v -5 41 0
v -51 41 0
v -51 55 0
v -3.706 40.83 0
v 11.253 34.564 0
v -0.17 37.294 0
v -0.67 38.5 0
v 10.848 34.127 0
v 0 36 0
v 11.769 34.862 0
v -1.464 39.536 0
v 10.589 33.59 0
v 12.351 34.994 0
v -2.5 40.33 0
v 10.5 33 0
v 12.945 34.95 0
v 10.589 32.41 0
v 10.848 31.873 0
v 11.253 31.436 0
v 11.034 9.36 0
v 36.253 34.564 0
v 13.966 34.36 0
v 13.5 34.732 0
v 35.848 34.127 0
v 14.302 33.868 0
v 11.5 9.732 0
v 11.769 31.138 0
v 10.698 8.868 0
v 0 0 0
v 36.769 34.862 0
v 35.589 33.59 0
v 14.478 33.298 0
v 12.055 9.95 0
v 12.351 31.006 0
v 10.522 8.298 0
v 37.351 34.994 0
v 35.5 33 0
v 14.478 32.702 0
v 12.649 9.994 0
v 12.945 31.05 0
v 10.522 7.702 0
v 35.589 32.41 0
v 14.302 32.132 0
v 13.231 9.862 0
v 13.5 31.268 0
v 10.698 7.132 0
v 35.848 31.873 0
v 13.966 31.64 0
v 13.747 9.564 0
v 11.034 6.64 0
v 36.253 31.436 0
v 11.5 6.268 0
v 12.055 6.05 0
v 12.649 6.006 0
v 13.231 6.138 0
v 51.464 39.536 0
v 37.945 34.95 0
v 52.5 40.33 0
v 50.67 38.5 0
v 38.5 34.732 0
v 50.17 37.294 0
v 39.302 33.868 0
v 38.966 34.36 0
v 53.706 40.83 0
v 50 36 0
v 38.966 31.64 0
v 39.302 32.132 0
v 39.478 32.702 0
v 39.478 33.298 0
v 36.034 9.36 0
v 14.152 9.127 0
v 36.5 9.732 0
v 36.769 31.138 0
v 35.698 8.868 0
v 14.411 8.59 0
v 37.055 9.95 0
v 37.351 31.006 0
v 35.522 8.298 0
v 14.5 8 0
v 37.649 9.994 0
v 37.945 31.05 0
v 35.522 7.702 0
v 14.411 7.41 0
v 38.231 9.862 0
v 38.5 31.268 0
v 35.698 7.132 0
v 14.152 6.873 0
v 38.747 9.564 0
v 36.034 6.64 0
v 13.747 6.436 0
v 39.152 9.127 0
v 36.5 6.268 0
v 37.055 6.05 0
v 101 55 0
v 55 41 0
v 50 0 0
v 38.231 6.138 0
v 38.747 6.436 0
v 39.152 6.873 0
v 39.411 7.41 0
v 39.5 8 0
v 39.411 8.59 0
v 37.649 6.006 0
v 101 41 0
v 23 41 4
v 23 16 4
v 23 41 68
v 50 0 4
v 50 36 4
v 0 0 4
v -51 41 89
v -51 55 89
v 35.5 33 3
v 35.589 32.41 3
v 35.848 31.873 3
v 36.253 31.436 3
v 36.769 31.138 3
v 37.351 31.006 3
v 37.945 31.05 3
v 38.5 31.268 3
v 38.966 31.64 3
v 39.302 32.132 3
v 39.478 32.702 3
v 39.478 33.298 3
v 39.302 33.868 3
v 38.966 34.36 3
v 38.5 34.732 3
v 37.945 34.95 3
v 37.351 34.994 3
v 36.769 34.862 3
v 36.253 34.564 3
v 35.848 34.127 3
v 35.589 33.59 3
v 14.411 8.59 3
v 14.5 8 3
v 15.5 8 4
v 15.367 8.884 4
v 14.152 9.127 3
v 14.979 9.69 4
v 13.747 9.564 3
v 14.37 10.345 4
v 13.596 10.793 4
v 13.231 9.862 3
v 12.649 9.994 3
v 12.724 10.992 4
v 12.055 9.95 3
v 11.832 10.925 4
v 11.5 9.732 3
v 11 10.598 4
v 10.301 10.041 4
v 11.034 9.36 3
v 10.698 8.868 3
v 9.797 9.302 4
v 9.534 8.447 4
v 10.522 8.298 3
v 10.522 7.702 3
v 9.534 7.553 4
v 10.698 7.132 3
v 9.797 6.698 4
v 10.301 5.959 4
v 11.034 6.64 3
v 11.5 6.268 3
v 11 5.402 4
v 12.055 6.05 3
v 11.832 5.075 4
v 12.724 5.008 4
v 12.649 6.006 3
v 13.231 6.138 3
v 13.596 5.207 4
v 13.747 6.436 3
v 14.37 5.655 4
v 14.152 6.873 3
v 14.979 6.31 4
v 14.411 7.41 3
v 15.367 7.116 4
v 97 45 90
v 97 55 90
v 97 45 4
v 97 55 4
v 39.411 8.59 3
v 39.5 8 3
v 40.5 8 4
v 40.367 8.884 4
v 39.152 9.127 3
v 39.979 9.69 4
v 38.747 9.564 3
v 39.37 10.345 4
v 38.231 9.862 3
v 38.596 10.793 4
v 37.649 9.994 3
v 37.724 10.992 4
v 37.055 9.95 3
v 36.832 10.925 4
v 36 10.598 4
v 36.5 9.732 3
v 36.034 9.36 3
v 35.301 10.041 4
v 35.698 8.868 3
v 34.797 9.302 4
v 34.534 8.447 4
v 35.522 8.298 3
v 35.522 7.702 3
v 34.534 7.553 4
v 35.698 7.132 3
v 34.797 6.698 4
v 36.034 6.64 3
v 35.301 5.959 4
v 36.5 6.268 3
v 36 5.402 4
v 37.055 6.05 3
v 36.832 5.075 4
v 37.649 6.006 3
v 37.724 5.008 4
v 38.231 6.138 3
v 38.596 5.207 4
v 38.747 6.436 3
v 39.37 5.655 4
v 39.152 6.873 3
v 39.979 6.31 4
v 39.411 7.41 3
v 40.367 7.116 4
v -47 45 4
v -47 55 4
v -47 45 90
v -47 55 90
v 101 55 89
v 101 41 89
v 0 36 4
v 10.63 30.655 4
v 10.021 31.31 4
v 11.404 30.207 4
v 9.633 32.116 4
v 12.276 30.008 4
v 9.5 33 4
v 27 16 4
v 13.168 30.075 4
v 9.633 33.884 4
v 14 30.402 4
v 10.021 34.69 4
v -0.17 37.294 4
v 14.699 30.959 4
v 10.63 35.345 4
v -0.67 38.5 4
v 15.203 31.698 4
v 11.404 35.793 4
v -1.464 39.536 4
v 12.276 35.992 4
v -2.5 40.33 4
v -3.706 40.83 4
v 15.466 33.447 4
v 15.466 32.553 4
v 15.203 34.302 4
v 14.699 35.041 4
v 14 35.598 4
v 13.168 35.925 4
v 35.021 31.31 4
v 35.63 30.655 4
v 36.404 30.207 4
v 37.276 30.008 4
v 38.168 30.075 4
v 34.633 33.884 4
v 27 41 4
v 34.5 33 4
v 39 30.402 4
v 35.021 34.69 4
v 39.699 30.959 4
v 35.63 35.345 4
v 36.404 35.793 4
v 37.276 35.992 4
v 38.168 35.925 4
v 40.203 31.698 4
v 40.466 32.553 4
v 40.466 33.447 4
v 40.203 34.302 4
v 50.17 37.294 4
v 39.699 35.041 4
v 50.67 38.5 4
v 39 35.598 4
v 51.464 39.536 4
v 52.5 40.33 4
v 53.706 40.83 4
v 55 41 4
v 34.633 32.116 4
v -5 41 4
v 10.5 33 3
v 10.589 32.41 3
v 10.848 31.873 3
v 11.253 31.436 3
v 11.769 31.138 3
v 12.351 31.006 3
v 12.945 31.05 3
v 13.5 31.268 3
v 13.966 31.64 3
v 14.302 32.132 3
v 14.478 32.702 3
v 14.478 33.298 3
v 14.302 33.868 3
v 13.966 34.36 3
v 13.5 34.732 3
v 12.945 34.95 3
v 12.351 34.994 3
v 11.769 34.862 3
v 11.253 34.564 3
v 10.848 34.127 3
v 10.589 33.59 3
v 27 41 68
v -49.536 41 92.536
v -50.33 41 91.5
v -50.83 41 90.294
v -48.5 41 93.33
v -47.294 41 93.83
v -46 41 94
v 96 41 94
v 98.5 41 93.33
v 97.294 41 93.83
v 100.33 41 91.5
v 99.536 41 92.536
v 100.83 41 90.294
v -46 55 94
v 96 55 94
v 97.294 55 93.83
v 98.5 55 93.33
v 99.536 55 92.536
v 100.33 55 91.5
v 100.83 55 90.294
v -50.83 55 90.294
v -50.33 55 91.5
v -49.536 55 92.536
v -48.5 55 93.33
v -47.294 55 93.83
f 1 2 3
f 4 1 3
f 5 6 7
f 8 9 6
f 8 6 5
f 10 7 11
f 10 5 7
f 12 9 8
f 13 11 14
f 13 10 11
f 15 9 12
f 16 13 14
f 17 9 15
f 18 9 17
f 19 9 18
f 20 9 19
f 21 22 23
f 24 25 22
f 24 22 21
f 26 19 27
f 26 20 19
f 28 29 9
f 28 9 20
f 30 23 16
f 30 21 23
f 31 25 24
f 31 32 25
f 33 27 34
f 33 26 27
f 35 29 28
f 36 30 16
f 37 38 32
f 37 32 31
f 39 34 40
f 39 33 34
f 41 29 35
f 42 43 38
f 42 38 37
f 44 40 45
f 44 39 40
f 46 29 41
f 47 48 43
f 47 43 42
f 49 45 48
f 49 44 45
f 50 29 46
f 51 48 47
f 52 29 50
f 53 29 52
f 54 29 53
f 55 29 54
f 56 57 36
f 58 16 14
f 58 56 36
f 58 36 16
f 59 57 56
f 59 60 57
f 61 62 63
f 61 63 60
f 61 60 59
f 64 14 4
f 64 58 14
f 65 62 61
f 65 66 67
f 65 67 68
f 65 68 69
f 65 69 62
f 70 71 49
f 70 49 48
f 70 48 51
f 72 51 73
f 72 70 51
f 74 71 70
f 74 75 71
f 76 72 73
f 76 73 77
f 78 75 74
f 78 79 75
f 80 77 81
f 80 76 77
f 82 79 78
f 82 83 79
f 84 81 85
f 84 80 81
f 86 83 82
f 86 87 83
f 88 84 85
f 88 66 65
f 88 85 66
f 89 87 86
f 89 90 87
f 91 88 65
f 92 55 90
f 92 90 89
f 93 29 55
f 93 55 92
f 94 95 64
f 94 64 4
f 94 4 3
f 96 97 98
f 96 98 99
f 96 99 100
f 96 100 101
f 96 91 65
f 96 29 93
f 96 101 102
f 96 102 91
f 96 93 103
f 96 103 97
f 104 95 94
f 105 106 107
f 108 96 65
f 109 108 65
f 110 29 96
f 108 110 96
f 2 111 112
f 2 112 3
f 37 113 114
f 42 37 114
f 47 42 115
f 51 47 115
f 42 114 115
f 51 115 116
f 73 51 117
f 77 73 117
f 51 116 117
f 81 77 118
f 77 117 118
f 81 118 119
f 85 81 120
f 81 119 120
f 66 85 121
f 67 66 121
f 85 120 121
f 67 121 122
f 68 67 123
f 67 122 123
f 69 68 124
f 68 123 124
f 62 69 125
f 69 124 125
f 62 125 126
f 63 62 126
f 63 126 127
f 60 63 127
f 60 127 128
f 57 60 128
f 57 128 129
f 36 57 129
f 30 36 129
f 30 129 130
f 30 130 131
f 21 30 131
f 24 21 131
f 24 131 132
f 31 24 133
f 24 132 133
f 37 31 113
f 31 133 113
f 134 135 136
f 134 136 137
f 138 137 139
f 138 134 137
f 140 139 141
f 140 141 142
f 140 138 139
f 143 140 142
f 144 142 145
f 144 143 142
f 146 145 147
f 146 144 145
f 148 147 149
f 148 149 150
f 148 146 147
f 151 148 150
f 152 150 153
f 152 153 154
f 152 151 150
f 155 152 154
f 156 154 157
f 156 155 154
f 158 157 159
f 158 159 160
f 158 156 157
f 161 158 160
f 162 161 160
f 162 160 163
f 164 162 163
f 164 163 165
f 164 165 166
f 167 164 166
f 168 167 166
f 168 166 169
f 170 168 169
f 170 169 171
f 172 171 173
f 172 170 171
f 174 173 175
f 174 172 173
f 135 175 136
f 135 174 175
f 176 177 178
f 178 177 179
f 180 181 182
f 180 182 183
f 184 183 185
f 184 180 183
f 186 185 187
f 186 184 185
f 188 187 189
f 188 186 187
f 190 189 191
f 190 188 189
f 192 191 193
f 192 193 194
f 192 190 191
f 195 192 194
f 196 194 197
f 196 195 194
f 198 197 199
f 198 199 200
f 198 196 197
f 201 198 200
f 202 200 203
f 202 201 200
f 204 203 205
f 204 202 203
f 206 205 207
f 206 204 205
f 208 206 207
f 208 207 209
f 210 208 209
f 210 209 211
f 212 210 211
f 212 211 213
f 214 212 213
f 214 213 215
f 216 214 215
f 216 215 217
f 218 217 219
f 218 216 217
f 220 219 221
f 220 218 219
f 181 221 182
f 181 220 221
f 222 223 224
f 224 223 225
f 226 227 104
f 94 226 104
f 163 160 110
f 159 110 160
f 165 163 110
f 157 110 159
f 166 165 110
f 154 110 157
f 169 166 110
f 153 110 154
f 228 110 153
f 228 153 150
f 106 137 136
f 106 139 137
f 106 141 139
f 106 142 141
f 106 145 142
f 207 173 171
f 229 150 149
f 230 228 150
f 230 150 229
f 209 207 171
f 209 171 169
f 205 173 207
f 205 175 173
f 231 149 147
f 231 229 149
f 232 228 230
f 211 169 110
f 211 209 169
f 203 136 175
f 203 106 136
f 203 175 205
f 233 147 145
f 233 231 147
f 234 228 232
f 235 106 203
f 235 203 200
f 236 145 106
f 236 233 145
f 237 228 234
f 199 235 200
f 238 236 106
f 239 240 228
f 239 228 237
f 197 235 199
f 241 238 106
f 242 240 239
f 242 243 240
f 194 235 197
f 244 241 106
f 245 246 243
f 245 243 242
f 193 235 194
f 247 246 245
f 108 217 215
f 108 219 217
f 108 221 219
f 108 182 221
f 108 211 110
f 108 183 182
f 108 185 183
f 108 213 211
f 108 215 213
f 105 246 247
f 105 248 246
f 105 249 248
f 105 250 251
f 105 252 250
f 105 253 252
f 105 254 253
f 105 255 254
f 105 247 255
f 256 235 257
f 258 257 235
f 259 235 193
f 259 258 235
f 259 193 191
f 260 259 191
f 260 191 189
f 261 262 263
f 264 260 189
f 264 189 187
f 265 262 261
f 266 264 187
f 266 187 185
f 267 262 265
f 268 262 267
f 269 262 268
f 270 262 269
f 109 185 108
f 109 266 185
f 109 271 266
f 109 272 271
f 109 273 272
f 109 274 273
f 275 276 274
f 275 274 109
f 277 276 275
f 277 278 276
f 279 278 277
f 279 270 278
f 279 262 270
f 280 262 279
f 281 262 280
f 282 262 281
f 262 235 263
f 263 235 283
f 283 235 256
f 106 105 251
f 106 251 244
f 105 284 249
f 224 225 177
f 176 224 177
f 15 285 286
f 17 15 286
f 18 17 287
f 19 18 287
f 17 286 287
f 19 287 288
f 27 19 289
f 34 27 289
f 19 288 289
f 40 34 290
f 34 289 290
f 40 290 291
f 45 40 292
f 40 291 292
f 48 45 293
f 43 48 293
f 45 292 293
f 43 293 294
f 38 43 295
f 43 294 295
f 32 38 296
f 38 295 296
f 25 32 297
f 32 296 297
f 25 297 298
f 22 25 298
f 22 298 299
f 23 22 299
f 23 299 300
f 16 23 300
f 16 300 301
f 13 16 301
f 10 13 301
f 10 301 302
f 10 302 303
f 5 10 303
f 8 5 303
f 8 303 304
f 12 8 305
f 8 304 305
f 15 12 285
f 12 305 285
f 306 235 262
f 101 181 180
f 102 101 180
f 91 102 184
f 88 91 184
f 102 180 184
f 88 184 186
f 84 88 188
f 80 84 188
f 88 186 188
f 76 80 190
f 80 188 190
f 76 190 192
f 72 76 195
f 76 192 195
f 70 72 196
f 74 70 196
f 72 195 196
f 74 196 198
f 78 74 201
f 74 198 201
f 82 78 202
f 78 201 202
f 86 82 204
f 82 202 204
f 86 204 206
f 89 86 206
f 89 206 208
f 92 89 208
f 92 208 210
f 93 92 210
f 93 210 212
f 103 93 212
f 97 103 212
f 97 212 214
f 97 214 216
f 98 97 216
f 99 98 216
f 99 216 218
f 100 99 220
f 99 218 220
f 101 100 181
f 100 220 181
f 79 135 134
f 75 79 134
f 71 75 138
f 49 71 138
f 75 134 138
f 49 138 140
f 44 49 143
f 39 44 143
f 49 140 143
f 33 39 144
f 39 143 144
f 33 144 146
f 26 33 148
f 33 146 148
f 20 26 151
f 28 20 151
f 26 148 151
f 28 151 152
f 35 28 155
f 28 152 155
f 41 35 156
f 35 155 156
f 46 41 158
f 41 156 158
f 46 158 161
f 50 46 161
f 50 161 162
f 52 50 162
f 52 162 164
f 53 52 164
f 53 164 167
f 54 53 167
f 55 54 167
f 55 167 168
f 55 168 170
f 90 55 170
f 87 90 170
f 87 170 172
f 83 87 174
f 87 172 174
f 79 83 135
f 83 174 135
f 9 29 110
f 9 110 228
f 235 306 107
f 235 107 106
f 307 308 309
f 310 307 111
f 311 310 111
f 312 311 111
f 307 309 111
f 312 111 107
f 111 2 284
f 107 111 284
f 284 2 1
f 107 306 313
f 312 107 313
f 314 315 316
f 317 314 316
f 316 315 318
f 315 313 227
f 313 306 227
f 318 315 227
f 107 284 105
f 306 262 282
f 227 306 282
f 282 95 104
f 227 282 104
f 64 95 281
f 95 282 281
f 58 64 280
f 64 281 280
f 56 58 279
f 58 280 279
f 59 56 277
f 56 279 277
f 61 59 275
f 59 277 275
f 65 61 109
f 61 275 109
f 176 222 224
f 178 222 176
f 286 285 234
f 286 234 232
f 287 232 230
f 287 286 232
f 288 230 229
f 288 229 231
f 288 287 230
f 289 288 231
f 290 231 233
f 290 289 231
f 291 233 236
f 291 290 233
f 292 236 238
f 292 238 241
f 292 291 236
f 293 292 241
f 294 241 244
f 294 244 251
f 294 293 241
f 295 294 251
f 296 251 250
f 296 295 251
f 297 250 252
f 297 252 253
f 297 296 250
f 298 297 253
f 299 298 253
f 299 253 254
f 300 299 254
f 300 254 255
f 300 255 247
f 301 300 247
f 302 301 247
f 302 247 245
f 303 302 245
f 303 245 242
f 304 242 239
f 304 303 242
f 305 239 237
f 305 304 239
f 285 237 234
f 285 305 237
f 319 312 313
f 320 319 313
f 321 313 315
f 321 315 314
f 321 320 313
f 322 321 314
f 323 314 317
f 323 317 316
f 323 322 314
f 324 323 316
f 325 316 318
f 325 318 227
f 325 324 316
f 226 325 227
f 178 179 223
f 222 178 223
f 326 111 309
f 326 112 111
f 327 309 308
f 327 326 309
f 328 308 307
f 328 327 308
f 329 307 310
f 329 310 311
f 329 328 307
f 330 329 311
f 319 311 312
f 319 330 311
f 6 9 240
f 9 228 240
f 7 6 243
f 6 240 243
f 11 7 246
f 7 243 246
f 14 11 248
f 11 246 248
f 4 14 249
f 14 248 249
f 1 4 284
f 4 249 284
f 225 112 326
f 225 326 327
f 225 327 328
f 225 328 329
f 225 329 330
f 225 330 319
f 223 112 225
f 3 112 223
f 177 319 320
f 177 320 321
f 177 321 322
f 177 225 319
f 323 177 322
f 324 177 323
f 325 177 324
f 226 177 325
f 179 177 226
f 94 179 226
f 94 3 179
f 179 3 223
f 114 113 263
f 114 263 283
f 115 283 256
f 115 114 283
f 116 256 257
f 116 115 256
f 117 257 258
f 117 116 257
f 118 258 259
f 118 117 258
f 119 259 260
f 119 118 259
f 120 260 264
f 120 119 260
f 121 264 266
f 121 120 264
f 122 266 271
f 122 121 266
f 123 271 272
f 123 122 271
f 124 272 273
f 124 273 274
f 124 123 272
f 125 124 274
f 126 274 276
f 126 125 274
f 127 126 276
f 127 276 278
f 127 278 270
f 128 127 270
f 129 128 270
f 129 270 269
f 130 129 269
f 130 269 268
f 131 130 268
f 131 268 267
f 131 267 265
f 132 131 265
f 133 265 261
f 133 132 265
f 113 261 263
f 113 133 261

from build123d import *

# Parameters (mm, degrees)
SKETCH2_W           = 50
SKETCH2_H           = 41
BOSS_EXTRUDE1_DEPTH = 4
SKETCH4_W           = 152
SKETCH4_H           = 94
BOSS_EXTRUDE2_DEPTH = 14
CUT_EXTRUDE1_DEPTH  = 10
FILLET1_R           = 5
SKETCH5_W           = 4
SKETCH5_H           = 41
BOSS_EXTRUDE3_DEPTH = 80
CUT_EXTRUDE2_DEPTH  = 4
SKETCH7_R           = 2
CUT_EXTRUDE3_DEPTH  = 4
CHAMFER1_SIZE       = 1
FILLET2_R           = 5


with BuildPart() as part:
    # Sketch2 → Boss-Extrude1 (new body)
    with BuildSketch(Plane.XY):
        with Locations((25, 20.5)):
            Rectangle(SKETCH2_W, SKETCH2_H)
    extrude(amount=BOSS_EXTRUDE1_DEPTH)

    # Sketch4 → Boss-Extrude2 (add)
    with BuildSketch(Plane(origin=(0, 41, 0), x_dir=(1, 0, 0), z_dir=(0, 1, 0))):
        with Locations((25, -47)):
            Rectangle(SKETCH4_W, SKETCH4_H)
    extrude(amount=BOSS_EXTRUDE2_DEPTH)

    # 3DSketch1 → Cut-Extrude1 (cut)
    with BuildSketch(Plane(origin=(97, 55, 90), x_dir=(-0.8585432690668222, 0, -0.512741119026019), z_dir=(0, -1, 0))):
        Polygon((0, 0), (44.095736236, 73.83472114), (167.725966982, 0), (123.630230746, -73.83472114), align=None)
    extrude(amount=CUT_EXTRUDE1_DEPTH, mode=Mode.SUBTRACT)

    # Fillet1
    fillet1_edges = [part.edges().sort_by_distance(p)[0] for p in [
        (-51, 48, 94),
        (101, 48, 94),
    ]]
    fillet(fillet1_edges, radius=FILLET1_R)

    # Sketch5 → Boss-Extrude3 (add)
    with BuildSketch(Plane.XY.offset(4)):
        with Locations((25, 20.5)):
            Rectangle(SKETCH5_W, SKETCH5_H)
    extrude(amount=BOSS_EXTRUDE3_DEPTH)

    # Sketch6 → Cut-Extrude2 (cut)
    with BuildSketch(Plane(origin=(27, 0, 0), x_dir=(0, 0, -1), z_dir=(1, 0, 0))):
        Polygon((-4, 0), (-84, 0), (-84, 41), (-68, 41), (-4, 16), align=None)
    extrude(amount=-CUT_EXTRUDE2_DEPTH, mode=Mode.SUBTRACT)

    # Sketch7 → Cut-Extrude3 (cut)
    with BuildSketch(Plane.XY.offset(4)):
        with Locations((12.5, 8)):
            Circle(SKETCH7_R)
        with Locations((37.5, 8)):
            Circle(SKETCH7_R)
        with Locations(Location((37.5, 33, 0), (0, 0, 180))):
            Circle(SKETCH7_R)
        with Locations(Location((12.5, 33, 0), (0, 0, 180))):
            Circle(SKETCH7_R)
    extrude(amount=-CUT_EXTRUDE3_DEPTH, mode=Mode.SUBTRACT)

    # Chamfer1
    chamfer1_edges = [part.edges().sort_by_distance(p)[0] for p in [
        (10.5, 8, 4),
        (14.5, 33, 4),
        (39.5, 33, 4),
        (35.5, 8, 4),
    ]]
    chamfer(chamfer1_edges, length=CHAMFER1_SIZE)

    # Fillet2
    fillet2_edges = [part.edges().sort_by_distance(p)[0] for p in [
        (0, 41, 2),
        (50, 41, 2),
    ]]
    fillet(fillet2_edges, radius=FILLET2_R)


solid = part.part
